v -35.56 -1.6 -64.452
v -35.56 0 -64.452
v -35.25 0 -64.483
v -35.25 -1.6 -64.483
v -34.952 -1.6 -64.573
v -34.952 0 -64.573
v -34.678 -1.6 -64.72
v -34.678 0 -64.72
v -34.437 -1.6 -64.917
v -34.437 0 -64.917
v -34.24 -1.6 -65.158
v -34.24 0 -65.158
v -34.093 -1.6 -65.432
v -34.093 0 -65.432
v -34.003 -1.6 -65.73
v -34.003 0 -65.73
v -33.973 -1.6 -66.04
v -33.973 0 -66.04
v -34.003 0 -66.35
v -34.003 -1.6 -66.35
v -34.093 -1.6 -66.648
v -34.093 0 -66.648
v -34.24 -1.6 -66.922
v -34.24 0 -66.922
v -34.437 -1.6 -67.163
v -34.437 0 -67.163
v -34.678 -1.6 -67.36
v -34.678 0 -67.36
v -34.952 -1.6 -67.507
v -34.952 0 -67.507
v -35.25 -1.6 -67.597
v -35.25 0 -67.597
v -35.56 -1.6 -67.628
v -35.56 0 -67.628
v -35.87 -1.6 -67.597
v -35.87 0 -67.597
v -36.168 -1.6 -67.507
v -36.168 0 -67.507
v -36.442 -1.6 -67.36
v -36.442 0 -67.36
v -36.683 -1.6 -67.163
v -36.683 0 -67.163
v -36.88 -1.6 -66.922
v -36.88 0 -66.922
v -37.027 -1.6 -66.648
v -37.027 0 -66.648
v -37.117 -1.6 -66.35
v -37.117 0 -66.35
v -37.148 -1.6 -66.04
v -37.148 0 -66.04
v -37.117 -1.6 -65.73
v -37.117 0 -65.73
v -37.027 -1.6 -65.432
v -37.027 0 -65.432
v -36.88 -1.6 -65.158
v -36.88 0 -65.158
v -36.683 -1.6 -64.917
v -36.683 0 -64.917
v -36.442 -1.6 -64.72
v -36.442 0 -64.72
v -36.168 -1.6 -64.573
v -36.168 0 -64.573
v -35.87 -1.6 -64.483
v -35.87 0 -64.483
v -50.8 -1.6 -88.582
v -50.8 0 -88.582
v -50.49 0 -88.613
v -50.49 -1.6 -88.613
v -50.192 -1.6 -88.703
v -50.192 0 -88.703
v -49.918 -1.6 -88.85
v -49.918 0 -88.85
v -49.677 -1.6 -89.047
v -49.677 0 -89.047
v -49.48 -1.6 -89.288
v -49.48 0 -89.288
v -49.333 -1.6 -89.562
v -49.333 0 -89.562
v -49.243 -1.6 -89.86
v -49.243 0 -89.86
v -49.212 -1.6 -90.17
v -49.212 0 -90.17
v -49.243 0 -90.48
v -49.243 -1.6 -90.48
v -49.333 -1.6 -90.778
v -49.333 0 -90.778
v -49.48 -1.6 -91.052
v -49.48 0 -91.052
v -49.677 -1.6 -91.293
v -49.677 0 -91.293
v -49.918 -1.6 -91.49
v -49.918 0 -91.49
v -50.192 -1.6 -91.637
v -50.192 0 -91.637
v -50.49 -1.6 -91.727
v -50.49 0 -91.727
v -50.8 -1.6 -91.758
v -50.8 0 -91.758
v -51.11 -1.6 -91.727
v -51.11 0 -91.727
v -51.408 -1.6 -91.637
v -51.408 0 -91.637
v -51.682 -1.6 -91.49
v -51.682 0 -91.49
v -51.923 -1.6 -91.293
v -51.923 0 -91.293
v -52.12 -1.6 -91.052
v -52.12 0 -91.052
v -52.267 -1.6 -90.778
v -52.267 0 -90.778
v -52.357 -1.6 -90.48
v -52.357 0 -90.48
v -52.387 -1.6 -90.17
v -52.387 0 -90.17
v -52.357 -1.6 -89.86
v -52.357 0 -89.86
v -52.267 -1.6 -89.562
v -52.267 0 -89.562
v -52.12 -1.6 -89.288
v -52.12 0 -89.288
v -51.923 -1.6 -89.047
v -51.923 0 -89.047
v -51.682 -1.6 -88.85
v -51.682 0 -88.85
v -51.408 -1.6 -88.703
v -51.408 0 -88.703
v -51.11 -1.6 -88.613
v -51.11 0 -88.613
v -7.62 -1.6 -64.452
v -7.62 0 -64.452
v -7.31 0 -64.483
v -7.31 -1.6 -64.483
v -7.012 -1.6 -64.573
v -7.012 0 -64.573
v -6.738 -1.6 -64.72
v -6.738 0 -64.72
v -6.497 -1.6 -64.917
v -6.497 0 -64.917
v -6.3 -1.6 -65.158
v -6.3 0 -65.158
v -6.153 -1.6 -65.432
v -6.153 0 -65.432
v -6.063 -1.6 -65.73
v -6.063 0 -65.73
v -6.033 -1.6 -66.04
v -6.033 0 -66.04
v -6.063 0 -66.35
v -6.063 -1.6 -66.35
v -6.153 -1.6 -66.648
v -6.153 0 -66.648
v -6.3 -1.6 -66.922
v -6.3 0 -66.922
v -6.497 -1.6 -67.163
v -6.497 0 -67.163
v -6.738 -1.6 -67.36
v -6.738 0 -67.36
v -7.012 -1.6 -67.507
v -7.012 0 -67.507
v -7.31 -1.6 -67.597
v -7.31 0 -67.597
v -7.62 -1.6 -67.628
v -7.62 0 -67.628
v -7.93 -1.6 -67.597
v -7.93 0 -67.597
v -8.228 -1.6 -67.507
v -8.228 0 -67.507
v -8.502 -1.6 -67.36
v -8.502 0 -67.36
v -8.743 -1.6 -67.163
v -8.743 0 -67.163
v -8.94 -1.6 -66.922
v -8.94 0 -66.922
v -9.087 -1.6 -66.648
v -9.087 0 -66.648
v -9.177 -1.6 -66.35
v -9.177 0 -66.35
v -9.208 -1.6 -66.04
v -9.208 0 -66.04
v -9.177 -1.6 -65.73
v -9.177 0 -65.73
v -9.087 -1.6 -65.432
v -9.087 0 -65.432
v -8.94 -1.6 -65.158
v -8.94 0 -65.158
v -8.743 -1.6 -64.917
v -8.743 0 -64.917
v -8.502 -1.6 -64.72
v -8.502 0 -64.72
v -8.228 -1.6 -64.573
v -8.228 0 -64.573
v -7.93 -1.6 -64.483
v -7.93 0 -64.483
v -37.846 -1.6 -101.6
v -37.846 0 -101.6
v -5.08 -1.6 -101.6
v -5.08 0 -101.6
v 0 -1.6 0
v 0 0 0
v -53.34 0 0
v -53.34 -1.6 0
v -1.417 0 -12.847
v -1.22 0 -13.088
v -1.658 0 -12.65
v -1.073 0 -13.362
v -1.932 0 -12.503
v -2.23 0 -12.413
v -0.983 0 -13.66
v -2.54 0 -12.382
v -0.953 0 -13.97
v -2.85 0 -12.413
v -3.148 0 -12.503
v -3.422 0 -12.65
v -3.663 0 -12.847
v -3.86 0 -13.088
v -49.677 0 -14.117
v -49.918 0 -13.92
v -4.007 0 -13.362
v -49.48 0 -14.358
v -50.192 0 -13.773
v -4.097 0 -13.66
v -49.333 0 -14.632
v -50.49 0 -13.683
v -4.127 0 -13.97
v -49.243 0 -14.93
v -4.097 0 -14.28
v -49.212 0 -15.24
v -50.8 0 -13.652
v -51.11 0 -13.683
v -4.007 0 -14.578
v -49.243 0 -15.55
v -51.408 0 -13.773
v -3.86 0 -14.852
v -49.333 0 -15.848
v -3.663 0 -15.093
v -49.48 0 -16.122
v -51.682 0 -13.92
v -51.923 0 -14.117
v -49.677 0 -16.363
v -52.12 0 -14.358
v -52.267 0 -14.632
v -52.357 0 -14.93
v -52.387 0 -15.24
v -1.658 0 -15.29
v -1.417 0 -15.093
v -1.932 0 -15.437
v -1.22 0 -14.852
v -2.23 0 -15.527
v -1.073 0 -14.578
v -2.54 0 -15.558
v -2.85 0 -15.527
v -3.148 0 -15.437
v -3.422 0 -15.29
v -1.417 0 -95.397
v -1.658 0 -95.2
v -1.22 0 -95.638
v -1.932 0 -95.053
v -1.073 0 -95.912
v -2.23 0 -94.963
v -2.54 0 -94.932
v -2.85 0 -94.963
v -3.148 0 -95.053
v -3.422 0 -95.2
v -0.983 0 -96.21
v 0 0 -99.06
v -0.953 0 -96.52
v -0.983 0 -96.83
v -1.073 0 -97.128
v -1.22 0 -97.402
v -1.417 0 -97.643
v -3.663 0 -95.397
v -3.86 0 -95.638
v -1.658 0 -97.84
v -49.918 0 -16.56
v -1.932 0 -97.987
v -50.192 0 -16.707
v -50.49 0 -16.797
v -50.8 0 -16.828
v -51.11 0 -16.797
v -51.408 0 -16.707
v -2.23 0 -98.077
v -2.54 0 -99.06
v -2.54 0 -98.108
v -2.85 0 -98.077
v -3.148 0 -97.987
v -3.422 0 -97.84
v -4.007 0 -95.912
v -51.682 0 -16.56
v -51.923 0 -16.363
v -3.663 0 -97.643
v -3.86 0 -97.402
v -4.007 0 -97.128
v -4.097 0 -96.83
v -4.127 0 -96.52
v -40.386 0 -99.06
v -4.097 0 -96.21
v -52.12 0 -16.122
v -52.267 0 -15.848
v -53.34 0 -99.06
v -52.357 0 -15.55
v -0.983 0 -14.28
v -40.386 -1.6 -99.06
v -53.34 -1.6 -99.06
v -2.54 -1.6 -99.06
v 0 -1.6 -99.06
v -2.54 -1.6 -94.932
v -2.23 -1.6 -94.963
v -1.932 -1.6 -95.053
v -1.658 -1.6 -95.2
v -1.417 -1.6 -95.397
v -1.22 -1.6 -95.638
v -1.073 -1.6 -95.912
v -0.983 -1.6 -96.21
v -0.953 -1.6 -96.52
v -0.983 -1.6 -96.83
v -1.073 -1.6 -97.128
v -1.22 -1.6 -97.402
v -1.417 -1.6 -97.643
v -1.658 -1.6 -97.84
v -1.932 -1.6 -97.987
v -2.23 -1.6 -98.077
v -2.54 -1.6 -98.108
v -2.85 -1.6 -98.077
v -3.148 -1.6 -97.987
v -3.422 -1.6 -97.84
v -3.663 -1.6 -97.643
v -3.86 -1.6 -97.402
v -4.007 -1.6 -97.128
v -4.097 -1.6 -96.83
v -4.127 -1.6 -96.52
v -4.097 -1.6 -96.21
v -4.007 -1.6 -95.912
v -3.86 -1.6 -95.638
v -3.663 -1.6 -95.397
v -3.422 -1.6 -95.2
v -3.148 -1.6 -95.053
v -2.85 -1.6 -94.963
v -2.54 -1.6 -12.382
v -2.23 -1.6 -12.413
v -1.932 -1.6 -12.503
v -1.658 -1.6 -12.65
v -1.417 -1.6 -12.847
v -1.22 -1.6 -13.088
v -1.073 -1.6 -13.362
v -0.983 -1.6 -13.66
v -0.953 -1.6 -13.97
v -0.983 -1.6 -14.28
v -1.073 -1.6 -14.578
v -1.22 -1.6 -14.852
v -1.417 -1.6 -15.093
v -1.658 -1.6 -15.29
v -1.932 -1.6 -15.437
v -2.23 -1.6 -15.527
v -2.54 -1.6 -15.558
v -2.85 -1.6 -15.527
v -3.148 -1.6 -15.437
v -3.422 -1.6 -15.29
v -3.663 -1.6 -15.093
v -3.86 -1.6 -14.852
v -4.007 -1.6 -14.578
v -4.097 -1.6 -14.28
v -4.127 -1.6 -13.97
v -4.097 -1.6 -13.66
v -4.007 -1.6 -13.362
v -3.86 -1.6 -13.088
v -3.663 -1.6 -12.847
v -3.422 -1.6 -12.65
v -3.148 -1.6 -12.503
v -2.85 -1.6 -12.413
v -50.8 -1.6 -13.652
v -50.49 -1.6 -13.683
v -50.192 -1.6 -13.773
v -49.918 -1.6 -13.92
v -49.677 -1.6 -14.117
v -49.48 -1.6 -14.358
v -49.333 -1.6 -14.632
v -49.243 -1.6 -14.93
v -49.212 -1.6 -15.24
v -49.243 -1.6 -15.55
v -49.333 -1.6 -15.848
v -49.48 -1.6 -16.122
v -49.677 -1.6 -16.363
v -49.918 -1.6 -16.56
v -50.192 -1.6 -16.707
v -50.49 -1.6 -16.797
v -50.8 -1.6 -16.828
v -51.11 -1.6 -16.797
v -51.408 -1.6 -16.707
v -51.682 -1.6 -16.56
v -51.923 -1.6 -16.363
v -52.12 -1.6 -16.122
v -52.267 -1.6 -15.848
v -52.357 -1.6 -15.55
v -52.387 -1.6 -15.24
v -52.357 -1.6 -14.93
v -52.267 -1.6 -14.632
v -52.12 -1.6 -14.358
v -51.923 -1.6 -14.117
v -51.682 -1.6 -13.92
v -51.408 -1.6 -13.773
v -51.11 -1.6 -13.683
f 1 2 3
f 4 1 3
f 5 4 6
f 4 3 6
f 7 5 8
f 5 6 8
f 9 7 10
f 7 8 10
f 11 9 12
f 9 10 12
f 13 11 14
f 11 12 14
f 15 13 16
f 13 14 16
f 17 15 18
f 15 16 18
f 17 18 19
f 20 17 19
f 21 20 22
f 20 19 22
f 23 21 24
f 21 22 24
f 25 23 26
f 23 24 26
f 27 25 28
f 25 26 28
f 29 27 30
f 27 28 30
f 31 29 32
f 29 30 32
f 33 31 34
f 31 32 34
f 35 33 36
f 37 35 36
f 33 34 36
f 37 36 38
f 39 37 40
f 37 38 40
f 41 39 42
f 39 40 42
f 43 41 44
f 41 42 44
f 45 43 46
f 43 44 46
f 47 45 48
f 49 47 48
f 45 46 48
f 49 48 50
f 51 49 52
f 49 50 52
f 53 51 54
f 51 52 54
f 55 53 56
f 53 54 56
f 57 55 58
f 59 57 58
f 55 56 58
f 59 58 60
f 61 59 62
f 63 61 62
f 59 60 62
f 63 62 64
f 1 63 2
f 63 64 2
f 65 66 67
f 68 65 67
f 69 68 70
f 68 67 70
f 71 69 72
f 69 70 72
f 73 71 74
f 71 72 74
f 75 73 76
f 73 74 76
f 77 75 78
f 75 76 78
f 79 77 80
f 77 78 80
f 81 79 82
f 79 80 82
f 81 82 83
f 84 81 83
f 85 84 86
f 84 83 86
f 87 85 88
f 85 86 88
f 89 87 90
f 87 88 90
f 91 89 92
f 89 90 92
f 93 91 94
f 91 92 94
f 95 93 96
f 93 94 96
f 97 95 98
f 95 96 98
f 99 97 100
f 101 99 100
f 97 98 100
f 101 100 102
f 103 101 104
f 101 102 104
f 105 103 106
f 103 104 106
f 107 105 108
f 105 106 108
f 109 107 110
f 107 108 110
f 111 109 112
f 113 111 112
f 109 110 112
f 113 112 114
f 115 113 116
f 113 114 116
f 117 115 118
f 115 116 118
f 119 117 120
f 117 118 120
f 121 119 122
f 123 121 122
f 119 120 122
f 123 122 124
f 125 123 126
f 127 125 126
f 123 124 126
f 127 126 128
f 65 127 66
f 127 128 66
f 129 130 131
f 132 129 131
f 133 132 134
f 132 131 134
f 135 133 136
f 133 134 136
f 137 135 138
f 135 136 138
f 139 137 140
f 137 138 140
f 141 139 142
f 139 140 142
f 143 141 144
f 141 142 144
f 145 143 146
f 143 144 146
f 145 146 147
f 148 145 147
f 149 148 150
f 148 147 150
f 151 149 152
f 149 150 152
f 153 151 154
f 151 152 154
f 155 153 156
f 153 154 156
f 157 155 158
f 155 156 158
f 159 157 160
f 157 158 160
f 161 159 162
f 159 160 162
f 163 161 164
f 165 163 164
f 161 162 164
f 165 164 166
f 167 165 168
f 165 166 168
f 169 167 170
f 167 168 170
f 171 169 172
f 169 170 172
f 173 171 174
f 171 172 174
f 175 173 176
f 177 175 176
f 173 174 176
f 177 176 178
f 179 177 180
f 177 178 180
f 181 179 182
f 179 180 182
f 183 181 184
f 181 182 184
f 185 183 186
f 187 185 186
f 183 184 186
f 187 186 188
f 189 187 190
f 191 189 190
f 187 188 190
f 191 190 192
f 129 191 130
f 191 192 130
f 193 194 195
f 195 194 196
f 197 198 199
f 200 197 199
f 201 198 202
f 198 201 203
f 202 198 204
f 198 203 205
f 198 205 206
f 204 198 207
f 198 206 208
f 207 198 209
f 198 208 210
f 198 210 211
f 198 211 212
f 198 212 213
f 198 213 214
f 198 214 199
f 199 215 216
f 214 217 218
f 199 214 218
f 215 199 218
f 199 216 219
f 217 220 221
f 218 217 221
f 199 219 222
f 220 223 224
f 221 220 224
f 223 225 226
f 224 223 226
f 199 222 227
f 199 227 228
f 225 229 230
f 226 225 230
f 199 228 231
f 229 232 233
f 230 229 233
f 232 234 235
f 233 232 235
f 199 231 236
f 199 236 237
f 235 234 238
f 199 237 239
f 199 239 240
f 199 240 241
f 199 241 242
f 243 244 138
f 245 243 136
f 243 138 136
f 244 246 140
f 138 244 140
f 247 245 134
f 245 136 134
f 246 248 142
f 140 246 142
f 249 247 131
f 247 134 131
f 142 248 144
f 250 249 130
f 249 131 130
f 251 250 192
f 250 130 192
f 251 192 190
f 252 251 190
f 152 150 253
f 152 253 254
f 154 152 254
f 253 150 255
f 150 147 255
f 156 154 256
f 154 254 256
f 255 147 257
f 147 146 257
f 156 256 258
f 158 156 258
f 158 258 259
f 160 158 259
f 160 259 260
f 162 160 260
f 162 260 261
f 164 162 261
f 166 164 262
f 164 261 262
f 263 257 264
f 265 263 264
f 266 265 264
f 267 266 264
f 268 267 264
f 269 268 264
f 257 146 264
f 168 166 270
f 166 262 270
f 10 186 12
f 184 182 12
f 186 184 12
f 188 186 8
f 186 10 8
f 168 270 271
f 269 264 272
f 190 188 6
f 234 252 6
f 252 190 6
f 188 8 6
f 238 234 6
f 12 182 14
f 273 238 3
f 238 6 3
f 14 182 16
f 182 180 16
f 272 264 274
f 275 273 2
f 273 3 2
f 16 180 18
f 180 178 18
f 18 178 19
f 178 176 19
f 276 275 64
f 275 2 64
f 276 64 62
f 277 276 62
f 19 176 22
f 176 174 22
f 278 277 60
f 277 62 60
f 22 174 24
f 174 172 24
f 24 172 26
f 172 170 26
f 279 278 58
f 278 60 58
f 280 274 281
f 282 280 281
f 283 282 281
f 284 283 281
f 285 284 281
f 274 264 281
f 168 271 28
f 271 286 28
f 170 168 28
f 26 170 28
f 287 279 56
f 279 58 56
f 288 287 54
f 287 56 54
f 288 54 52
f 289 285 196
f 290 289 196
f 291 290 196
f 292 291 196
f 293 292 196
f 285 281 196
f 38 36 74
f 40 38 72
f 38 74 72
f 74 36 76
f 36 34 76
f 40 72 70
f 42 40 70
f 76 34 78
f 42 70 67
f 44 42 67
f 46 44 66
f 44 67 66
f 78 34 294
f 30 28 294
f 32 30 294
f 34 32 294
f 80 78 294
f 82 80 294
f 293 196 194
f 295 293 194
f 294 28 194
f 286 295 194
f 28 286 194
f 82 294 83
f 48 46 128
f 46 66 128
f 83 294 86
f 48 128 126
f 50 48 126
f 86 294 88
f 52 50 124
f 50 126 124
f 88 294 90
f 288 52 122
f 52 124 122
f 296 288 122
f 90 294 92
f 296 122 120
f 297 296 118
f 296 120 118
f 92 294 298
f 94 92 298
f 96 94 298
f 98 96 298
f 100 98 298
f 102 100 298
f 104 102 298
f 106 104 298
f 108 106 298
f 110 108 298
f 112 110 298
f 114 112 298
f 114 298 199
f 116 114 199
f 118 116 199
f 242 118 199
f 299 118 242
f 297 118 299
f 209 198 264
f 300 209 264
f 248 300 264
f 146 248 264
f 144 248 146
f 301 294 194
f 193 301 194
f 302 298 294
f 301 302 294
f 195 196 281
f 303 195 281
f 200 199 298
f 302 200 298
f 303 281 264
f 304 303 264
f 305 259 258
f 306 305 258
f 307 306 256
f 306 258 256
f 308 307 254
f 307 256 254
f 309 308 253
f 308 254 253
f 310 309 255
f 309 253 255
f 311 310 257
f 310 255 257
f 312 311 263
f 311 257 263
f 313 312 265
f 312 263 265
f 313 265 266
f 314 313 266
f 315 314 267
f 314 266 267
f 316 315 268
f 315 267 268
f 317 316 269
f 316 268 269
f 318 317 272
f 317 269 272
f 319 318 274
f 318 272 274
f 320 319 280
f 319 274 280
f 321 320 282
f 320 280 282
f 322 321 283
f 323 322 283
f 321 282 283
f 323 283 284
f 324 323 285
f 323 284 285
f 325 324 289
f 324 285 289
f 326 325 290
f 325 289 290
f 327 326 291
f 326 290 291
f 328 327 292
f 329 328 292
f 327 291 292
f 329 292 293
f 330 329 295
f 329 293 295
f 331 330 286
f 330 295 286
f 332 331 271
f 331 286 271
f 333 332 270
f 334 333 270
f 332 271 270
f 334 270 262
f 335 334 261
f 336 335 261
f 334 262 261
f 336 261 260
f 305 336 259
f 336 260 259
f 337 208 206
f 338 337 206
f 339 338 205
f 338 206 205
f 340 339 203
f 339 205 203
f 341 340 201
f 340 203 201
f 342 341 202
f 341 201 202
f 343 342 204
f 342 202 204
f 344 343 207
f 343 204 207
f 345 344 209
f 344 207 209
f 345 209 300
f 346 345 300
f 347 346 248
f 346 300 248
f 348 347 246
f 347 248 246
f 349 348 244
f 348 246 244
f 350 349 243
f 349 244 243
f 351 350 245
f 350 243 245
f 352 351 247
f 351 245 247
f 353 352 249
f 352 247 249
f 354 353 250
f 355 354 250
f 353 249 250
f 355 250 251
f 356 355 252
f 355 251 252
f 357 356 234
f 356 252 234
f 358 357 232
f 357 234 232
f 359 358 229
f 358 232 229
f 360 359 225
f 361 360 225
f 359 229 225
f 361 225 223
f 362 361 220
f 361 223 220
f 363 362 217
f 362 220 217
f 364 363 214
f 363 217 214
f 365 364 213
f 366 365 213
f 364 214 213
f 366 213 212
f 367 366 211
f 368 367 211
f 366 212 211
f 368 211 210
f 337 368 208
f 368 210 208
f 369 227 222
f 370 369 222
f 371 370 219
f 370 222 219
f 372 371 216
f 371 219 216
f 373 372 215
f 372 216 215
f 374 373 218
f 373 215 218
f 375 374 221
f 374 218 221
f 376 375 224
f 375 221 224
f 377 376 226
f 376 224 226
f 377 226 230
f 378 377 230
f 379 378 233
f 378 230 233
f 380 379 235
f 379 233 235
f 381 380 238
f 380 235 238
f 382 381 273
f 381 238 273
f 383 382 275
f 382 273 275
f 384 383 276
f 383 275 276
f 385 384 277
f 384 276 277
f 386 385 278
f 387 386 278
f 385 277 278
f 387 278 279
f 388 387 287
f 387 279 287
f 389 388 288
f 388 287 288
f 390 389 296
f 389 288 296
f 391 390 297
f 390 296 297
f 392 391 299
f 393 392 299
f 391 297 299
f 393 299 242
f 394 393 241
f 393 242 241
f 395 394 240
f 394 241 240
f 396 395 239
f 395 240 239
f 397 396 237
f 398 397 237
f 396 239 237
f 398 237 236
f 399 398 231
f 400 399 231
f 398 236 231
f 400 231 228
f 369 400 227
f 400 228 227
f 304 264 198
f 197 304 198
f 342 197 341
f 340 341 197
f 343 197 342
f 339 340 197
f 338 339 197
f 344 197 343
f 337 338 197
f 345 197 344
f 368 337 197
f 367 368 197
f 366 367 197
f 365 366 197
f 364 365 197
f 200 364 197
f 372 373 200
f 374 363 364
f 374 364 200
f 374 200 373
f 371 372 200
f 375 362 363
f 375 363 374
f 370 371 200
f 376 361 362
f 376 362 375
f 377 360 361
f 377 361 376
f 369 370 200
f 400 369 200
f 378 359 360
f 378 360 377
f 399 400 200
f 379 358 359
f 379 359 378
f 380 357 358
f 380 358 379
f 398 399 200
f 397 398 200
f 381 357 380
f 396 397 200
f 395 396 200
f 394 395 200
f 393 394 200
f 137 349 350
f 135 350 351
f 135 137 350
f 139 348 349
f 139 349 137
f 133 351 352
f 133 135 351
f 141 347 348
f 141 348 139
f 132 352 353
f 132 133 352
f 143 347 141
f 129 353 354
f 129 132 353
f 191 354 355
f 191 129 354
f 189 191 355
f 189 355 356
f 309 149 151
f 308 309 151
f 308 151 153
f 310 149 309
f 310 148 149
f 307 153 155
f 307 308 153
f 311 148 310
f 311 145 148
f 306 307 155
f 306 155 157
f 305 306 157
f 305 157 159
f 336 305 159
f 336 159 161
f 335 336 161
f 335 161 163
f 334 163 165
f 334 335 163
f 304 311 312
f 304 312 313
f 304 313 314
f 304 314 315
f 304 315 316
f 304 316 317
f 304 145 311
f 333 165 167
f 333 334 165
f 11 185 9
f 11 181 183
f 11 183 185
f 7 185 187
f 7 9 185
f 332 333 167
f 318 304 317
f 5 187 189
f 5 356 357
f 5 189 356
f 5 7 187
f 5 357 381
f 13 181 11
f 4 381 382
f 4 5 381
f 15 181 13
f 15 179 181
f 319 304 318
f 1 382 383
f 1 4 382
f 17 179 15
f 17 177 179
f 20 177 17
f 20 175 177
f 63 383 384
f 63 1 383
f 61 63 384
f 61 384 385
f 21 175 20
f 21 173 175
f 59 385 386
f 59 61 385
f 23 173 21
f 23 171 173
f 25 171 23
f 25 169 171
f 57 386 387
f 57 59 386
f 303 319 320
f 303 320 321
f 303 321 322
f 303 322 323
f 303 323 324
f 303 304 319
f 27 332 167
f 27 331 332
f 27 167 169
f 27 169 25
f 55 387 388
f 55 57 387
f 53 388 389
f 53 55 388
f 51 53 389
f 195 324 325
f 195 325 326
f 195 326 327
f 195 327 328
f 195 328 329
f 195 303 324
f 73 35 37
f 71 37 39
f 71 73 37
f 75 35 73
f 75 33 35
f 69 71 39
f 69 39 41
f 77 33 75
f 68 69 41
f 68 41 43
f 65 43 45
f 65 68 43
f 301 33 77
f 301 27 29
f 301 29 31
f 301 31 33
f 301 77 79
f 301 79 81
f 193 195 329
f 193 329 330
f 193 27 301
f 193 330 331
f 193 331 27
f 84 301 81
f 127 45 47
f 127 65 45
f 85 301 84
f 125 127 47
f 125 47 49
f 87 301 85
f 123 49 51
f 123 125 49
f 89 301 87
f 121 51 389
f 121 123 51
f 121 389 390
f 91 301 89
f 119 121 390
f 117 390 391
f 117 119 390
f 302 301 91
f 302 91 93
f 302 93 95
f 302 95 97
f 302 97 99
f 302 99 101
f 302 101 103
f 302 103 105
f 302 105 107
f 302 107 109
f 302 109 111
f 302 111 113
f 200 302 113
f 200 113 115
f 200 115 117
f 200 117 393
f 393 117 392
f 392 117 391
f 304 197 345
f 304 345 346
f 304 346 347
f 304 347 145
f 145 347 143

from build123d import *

# Parameters (mm, degrees)
SKETCH1_R           = 1.5875
BOSS_EXTRUDE1_DEPTH = 1.6


with BuildPart() as part:
    # Sketch1 → Boss-Extrude1 (new body)
    with BuildSketch(Plane(origin=(0, 0, 0), x_dir=(1, 0, 0), z_dir=(0, 1, 0))):
        Polygon((0, 0), (-53.34, 0), (-53.34, 99.06), (-40.386, 99.06), (-37.846, 101.6), (-5.08, 101.6), (-2.54, 99.06), (0, 99.06), align=None)
        with Locations(Location((-7.62, 66.04, 0), (0, 0, 270))):
            Circle(SKETCH1_R, mode=Mode.SUBTRACT)
        with Locations(Location((-35.56, 66.04, 0), (0, 0, 270))):
            Circle(SKETCH1_R, mode=Mode.SUBTRACT)
        with Locations(Location((-2.54, 13.97, 0), (0, 0, 270))):
            Circle(SKETCH1_R, mode=Mode.SUBTRACT)
        with Locations(Location((-50.8, 15.24, 0), (0, 0, 270))):
            Circle(SKETCH1_R, mode=Mode.SUBTRACT)
        with Locations(Location((-2.54, 96.52, 0), (0, 0, 270))):
            Circle(SKETCH1_R, mode=Mode.SUBTRACT)
        with Locations(Location((-50.8, 90.17, 0), (0, 0, 270))):
            Circle(SKETCH1_R, mode=Mode.SUBTRACT)
    extrude(amount=-BOSS_EXTRUDE1_DEPTH)


solid = part.part
